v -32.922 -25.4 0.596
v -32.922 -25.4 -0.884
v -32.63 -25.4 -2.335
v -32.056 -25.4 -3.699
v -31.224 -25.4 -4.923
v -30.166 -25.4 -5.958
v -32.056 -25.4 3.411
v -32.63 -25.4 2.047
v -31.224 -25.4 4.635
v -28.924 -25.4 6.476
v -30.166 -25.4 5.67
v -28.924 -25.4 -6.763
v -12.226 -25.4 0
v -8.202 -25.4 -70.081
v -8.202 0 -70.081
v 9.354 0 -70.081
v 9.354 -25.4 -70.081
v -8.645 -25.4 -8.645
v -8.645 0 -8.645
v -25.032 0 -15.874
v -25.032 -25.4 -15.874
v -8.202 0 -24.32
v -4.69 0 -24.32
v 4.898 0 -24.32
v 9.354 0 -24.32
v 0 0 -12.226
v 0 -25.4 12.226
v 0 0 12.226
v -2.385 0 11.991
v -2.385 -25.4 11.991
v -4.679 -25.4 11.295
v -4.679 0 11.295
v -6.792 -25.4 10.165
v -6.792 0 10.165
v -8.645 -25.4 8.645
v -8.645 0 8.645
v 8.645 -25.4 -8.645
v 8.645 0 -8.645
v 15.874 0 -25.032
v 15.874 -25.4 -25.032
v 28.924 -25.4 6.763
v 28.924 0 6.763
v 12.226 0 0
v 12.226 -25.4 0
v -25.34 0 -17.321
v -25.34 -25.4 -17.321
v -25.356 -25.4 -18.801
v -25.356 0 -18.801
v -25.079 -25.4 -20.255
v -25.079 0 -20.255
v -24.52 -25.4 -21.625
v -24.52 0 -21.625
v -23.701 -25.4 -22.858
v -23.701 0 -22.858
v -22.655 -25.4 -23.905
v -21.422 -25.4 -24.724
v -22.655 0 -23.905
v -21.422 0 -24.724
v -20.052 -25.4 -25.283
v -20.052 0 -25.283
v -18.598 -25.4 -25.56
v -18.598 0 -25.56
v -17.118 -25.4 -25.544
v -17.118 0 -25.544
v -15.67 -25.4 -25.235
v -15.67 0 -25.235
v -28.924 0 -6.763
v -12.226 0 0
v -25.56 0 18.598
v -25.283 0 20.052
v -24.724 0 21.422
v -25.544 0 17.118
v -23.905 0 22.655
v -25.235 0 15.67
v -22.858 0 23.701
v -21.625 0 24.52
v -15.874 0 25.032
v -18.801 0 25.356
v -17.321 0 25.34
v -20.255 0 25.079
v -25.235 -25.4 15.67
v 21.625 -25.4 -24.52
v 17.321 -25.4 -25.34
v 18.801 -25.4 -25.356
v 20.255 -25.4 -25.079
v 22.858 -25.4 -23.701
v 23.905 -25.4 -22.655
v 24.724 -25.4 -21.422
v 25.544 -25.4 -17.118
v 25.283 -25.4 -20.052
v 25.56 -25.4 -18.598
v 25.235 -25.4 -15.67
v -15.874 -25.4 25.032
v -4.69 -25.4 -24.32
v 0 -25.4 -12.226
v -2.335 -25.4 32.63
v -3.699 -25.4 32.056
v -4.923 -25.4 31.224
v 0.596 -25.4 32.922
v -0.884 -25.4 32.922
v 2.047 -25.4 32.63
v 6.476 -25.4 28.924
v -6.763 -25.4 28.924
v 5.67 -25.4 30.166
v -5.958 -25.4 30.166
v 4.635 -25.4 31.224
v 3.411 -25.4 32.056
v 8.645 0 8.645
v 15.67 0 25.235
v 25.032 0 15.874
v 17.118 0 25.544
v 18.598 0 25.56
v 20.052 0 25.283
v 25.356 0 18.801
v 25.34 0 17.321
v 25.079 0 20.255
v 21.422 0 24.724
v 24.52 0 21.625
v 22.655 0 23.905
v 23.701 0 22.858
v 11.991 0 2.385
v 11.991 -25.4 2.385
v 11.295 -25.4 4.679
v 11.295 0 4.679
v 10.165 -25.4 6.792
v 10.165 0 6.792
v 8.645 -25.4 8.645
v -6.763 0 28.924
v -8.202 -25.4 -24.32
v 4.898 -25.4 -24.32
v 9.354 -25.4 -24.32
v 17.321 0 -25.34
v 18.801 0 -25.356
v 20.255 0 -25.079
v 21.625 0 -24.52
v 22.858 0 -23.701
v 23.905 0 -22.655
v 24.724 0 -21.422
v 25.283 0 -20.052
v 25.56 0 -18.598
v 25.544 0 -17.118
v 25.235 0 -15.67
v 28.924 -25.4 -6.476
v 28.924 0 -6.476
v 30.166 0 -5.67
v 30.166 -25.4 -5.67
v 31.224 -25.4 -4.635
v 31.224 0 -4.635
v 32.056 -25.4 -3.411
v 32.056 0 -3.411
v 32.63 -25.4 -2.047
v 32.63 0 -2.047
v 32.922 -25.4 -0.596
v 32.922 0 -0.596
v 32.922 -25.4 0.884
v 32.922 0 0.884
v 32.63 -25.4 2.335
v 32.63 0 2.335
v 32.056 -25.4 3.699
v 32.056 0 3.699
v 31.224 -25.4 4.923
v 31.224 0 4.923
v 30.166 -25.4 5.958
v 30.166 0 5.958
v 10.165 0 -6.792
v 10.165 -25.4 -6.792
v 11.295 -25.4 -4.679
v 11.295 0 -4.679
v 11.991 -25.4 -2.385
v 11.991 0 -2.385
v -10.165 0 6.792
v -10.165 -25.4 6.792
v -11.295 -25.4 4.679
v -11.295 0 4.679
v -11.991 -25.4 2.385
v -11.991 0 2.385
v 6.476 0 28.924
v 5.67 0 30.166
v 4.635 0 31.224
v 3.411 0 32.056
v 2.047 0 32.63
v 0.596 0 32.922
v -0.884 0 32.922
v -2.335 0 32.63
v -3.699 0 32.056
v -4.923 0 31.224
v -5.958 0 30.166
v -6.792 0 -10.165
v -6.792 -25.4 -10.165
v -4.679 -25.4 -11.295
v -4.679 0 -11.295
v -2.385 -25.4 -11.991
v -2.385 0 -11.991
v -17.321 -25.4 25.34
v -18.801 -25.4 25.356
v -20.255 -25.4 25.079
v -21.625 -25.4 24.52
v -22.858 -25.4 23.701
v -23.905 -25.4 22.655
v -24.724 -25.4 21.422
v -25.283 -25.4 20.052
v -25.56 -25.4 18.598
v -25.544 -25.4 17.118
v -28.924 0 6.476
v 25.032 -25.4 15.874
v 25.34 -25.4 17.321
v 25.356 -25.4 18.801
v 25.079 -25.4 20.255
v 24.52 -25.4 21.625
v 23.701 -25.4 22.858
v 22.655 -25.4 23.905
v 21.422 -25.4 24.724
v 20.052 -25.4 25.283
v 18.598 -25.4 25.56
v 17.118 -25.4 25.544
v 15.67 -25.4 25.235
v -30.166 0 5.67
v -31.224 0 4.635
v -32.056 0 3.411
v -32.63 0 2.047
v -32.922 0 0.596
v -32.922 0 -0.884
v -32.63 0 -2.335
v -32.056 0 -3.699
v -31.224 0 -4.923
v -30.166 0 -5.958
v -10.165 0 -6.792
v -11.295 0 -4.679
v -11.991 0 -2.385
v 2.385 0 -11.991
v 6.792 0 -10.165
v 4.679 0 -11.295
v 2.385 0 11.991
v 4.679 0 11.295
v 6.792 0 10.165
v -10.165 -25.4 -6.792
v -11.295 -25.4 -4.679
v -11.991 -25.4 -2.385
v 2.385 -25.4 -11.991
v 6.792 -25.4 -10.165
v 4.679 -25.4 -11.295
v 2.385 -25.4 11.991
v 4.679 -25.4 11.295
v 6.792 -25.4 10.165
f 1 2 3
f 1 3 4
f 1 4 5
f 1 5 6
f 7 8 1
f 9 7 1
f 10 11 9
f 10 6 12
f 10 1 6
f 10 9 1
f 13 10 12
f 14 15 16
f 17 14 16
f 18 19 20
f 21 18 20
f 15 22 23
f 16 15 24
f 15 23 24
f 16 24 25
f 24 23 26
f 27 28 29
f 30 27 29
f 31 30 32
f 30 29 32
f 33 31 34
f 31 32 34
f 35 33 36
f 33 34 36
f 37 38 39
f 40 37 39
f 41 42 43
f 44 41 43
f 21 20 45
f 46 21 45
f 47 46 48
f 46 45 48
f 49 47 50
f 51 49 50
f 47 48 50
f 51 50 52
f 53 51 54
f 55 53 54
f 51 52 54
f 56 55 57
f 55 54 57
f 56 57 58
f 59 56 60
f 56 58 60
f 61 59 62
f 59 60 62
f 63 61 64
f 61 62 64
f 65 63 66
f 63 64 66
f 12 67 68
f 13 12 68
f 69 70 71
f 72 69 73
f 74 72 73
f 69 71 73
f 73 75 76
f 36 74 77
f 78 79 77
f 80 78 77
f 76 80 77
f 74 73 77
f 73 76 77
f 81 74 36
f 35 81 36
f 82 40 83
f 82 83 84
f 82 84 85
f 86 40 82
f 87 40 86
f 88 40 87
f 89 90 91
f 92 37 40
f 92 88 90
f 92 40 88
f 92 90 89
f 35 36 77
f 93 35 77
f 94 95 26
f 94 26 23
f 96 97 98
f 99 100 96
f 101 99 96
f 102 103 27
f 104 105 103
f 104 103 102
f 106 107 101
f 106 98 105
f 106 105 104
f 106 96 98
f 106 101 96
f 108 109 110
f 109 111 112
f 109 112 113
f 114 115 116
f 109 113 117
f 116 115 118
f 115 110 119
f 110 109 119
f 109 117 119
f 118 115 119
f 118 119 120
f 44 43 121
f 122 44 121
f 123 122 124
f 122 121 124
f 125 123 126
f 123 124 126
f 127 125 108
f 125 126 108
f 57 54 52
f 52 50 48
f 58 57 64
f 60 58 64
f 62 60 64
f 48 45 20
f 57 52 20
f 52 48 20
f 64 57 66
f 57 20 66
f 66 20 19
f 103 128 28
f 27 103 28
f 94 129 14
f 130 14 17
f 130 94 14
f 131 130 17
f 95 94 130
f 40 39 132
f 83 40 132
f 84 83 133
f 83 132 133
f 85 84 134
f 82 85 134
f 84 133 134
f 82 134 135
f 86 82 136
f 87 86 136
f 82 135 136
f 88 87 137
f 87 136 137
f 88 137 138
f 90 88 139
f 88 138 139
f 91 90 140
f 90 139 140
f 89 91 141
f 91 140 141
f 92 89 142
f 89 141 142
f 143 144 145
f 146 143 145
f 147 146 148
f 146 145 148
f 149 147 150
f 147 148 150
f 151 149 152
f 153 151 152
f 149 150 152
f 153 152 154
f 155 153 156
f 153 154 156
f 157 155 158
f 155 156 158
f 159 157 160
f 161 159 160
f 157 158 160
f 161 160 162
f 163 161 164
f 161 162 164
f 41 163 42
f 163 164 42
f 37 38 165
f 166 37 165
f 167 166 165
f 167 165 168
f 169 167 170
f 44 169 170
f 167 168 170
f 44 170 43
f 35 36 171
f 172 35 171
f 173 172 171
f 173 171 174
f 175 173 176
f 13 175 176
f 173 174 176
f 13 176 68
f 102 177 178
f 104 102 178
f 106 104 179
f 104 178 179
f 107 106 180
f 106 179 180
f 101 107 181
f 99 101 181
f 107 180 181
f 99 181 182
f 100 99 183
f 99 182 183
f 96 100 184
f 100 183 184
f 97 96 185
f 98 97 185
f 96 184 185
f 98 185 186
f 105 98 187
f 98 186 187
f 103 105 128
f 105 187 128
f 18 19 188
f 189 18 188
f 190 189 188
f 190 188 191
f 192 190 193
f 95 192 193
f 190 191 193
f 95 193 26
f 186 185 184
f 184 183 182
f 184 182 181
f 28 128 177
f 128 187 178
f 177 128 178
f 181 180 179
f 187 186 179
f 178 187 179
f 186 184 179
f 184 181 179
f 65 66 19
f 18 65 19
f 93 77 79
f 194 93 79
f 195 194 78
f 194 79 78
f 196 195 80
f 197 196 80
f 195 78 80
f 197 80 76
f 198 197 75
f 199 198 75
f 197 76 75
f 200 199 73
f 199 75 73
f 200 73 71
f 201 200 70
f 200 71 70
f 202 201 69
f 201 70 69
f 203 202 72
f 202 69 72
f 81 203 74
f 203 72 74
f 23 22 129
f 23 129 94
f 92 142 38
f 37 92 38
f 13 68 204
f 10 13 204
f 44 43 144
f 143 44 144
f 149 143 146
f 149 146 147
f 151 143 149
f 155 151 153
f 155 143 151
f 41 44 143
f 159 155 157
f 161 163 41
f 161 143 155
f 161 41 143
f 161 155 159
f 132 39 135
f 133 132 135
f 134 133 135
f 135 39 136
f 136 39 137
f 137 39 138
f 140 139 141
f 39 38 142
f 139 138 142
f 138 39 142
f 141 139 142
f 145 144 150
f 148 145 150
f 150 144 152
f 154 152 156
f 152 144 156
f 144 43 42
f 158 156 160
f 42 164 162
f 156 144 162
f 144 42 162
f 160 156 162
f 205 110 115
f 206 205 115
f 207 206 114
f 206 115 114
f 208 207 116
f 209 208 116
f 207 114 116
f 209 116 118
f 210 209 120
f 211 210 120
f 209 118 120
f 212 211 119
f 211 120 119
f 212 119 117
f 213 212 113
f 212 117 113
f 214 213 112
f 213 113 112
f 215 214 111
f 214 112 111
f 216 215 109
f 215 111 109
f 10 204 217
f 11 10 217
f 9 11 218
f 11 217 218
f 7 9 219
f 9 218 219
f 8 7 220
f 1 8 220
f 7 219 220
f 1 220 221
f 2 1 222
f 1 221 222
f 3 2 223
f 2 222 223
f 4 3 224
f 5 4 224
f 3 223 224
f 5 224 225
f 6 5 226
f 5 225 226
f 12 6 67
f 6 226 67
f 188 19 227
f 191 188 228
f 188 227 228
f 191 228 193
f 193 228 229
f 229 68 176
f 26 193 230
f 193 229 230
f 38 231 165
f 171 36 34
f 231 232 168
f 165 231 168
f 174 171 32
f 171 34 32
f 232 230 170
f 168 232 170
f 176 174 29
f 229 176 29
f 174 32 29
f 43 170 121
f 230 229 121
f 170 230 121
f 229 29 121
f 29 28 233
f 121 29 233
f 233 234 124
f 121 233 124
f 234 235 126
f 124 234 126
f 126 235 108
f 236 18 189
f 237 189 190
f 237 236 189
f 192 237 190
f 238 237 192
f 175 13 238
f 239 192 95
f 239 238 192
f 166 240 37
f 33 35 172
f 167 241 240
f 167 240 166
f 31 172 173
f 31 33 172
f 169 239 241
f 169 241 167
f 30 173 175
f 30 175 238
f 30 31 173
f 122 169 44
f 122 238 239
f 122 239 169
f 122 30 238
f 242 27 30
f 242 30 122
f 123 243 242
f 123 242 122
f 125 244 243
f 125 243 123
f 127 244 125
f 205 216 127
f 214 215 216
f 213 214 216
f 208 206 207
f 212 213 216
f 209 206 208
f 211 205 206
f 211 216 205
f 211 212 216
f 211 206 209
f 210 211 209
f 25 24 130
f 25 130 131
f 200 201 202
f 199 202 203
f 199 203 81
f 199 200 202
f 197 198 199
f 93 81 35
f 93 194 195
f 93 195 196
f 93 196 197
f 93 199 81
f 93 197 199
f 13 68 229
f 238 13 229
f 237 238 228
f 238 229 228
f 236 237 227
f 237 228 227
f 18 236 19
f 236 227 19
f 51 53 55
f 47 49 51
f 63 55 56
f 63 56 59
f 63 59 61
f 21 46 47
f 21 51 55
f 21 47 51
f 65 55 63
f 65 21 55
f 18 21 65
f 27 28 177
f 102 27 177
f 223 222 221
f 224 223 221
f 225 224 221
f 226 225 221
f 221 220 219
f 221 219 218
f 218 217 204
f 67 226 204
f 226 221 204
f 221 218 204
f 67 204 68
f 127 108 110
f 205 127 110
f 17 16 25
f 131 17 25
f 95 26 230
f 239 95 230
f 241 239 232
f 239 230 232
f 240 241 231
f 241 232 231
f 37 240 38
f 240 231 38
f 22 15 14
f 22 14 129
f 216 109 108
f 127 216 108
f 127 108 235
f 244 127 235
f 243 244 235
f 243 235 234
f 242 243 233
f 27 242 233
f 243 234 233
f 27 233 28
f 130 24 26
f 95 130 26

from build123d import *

# Parameters (mm, degrees)
F0_W      = 17.556151
F0_H      = 45.761111
F1_DEPTH  = 25.4
F3_DEPTH  = 25.4
F4_DEPTH  = 25.4
F5_DEPTH  = 25.4
F6_DEPTH  = 25.4
F7_DEPTH  = 25.4
F8_DEPTH  = 25.4
F9_DEPTH  = 25.4
F10_DEPTH = 25.4


with BuildPart() as f1:
    # F0 (on Front) → F1 (new body)
    with BuildSketch(Plane.XZ):
        with Locations((0.575611, -47.200142)):
            Rectangle(F0_W, F0_H)
    extrude(amount=F1_DEPTH)

    # F2 (on Front) → F9 (join)
    with BuildSketch(Plane.XZ):
        with BuildLine():
            Line((6.763435, -28.924476), (0, -12.225818))
            Line((0, -12.225818), (-6.47563, -28.924476))
            ThreePointArc((-6.47563, -28.924476), (0.143903, -32.959325), (6.763435, -28.924476))
        make_face()
    extrude(amount=F9_DEPTH)


with BuildPart() as f3:
    # F2 (on Front) → F3 (new body)
    with BuildSketch(Plane.XZ):
        with BuildLine():
            Line((25.235164, -15.670222), (8.644959, -8.644959))
            Line((8.644959, -8.644959), (15.873732, -25.031655))
            ThreePointArc((15.873732, -25.031655), (23.407517, -23.204007), (25.235164, -15.670222))
        make_face()
        with BuildLine():
            Line((28.924476, 6.763435), (12.225818, 0))
            Line((12.225818, 0), (28.924476, -6.47563))
            ThreePointArc((28.924476, -6.47563), (32.959325, 0.143903), (28.924476, 6.763435))
        make_face()
    extrude(amount=F3_DEPTH)


with BuildPart() as f4:
    # F2 (on Front) → F4 (new body)
    with BuildSketch(Plane.XZ):
        with BuildLine():
            Line((15.670222, 25.235164), (8.644959, 8.644959))
            Line((8.644959, 8.644959), (25.031655, 15.873732))
            ThreePointArc((25.031655, 15.873732), (23.204007, 23.407517), (15.670222, 25.235164))
        make_face()
    extrude(amount=F4_DEPTH)


with BuildPart() as f5:
    # F2 (on Front) → F5 (new body)
    with BuildSketch(Plane.XZ):
        with BuildLine():
            Line((-25.235164, 15.670222), (-8.644959, 8.644959))
            Line((-8.644959, 8.644959), (-15.873732, 25.031655))
            ThreePointArc((-15.873732, 25.031655), (-23.407517, 23.204007), (-25.235164, 15.670222))
        make_face()
    extrude(amount=F5_DEPTH)


with BuildPart() as f6:
    # F2 (on Front) → F6 (new body)
    with BuildSketch(Plane.XZ):
        with BuildLine():
            Line((-28.924476, -6.763435), (-12.225818, 0))
            Line((-12.225818, 0), (-28.924476, 6.47563))
            ThreePointArc((-28.924476, 6.47563), (-32.959325, -0.143903), (-28.924476, -6.763435))
        make_face()
    extrude(amount=F6_DEPTH)


with BuildPart() as f7:
    # F2 (on Front) → F7 (new body)
    with BuildSketch(Plane.XZ):
        with BuildLine():
            Line((-6.763435, 28.924476), (0, 12.225818))
            Line((0, 12.225818), (6.47563, 28.924476))
            ThreePointArc((6.47563, 28.924476), (-0.143903, 32.959325), (-6.763435, 28.924476))
        make_face()
    extrude(amount=F7_DEPTH)


with BuildPart() as f8:
    # F2 (on Front) → F8 (new body)
    with BuildSketch(Plane.XZ):
        with BuildLine():
            Line((-15.670222, -25.235164), (-8.644959, -8.644959))
            Line((-8.644959, -8.644959), (-25.031655, -15.873732))
            ThreePointArc((-25.031655, -15.873732), (-23.204007, -23.407517), (-15.670222, -25.235164))
        make_face()
    extrude(amount=F8_DEPTH)


with BuildPart() as f10:
    # F2 (on Front) → F10 (new body)
    with BuildSketch(Plane.XZ):
        with BuildLine():
            ThreePointArc((8.644959, -8.644959), (11.295183, -4.678618), (12.225818, 0))
            ThreePointArc((12.225818, 0), (11.295183, 4.678618), (8.644959, 8.644959))
            ThreePointArc((8.644959, 8.644959), (4.678618, 11.295183), (0, 12.225818))
            ThreePointArc((0, 12.225818), (-4.678618, 11.295183), (-8.644959, 8.644959))
            ThreePointArc((-8.644959, 8.644959), (-11.295183, 4.678618), (-12.225818, 0))
            ThreePointArc((-12.225818, 0), (-11.295183, -4.678618), (-8.644959, -8.644959))
            ThreePointArc((-8.644959, -8.644959), (-4.678618, -11.295183), (0, -12.225818))
            ThreePointArc((0, -12.225818), (4.678618, -11.295183), (8.644959, -8.644959))
        make_face()
    extrude(amount=F10_DEPTH)


solid = Compound([f1.part, f3.part, f4.part, f5.part, f6.part, f7.part, f8.part, f10.part])
